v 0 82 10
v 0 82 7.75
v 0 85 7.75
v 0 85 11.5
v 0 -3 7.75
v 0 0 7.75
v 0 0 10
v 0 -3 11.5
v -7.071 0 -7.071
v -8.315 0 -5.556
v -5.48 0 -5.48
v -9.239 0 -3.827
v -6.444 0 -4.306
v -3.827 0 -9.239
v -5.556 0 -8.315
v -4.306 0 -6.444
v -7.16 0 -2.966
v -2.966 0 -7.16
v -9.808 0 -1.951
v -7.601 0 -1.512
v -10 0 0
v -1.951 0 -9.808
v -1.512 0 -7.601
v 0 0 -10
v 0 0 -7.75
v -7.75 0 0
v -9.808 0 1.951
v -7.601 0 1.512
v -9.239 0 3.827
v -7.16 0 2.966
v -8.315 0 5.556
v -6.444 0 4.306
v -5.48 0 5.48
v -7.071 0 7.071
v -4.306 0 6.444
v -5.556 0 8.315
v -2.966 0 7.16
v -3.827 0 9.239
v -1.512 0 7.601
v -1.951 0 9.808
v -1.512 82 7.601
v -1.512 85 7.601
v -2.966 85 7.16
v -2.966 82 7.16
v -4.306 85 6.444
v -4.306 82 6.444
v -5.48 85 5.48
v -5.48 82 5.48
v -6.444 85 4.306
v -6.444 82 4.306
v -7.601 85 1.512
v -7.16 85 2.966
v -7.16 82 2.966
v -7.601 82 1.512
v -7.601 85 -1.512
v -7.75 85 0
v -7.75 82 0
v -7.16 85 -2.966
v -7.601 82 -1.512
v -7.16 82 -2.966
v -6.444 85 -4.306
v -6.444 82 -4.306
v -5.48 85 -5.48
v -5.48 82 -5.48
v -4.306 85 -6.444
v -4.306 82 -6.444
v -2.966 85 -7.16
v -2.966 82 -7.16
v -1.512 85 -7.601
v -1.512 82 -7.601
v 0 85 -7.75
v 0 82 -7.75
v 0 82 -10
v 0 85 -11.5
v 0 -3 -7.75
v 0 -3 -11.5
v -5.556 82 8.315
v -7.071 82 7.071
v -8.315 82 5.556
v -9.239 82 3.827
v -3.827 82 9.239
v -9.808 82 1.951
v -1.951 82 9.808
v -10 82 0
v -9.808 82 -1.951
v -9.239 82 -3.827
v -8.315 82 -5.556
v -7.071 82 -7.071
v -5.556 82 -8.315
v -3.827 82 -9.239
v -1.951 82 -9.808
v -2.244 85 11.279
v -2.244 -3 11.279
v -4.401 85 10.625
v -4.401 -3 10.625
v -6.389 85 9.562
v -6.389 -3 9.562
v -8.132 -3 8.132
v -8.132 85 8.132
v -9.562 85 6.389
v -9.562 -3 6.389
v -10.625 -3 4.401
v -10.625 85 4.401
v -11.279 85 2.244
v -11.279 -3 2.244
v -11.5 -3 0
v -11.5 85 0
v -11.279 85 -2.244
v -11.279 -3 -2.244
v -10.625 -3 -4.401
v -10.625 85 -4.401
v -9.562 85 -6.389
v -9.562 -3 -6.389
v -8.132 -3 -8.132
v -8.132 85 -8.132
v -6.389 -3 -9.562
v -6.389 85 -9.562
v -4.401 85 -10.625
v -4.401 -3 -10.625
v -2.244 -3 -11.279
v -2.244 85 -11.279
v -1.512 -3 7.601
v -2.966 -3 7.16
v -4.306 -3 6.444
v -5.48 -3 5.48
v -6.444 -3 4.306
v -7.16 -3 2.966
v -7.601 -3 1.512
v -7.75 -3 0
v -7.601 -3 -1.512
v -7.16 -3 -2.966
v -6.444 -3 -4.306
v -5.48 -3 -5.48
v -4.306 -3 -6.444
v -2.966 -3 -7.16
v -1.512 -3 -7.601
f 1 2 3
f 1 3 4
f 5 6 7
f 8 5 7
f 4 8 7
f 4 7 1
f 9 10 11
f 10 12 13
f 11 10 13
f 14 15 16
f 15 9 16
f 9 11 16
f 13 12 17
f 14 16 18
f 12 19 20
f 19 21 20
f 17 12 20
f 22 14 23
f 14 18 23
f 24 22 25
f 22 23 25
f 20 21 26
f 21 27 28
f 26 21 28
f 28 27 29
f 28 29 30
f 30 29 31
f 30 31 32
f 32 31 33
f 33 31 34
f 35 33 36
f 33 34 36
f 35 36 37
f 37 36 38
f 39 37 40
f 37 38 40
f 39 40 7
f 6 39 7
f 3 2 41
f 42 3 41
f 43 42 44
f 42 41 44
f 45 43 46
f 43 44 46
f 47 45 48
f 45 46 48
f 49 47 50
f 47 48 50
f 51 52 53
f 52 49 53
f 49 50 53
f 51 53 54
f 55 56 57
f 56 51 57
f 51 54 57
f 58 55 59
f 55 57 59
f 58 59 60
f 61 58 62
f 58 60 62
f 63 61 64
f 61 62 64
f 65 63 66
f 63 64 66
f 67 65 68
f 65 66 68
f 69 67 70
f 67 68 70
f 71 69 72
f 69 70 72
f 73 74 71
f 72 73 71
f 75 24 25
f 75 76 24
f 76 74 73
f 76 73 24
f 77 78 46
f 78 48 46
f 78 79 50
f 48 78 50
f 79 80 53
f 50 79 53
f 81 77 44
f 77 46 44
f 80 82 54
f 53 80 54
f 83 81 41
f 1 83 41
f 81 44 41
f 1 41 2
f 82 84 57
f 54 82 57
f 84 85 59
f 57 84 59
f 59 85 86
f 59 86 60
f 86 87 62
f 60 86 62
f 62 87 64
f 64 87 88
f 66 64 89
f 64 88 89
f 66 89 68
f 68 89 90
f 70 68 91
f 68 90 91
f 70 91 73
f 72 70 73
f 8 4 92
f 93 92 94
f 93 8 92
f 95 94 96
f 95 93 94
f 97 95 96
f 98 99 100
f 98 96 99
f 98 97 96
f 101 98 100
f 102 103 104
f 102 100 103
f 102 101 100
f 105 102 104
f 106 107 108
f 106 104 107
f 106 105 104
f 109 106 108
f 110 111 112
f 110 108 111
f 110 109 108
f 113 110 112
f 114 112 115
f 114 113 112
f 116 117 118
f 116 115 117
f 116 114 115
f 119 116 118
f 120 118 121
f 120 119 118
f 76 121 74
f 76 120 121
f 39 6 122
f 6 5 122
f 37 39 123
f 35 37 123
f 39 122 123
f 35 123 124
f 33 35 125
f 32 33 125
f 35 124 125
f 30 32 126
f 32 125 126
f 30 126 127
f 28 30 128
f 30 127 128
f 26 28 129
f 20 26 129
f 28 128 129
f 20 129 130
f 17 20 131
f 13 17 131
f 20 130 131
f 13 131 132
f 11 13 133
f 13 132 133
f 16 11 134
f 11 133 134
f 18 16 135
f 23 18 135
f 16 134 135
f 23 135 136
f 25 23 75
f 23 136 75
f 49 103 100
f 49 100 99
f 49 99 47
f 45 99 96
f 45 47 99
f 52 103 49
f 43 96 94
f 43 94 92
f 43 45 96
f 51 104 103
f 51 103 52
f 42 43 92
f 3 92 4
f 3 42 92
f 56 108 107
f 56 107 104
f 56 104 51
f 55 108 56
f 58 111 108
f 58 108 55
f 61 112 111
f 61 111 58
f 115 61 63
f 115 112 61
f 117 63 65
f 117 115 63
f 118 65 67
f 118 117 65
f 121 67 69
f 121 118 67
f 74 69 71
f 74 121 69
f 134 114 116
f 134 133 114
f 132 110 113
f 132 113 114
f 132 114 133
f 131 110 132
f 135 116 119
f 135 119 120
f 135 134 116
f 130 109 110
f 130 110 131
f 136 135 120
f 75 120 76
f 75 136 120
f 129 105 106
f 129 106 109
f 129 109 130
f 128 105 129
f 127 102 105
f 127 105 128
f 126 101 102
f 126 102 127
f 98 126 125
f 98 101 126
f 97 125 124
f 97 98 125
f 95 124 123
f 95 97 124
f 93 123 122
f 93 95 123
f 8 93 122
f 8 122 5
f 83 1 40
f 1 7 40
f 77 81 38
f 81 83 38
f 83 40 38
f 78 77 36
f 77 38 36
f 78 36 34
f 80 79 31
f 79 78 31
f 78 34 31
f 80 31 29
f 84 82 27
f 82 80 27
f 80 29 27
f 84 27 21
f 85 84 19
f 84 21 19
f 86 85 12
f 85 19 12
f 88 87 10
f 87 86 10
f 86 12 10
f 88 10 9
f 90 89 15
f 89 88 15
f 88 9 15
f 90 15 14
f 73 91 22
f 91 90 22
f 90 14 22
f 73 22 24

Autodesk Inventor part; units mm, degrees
ref_plane "YZ Plane" through (0, 0, 0) normal (1, 0, 0) x (0, 1, 0)
ref_plane "XZ Plane" through (0, 0, 0) normal (0, 1, 0) x (-1, 0, 0)
ref_plane "XY Plane" through (0, 0, 0) normal (0, 0, 1) x (1, 0, 0)
sketch "草圖1" plane through (0, 0, 0) normal (0, 1, 0) x (-1, 0, 0)
  arc A0 (0, -10) -> (0, 10) centre (0, 0) ccw
  arc A1 (0, -11.5) -> (0, 11.5) centre (0, 0) ccw
  line L0 (0, 11.5) -> (0, 10)
  line L1 (0, -10) -> (0, -11.5)
  dimension "d0" = 20
  dimension "d1" = 23
extrude "擠出1" add sketch "草圖1" along normal blind 41
sketch "草圖2" plane through (0, 41, 0) normal (0, 1, 0) x (1, 0, 0)
  line L0 (0, -11.5) -> (0, -10) projected
  arc A0 (0, 11.5) -> (0, -11.5) centre (0, 0) ccw projected
  line L1 (0, 10) -> (0, 11.5) projected
  line L2 (0, -10) -> (0, 10)
extrude "擠出2" add sketch "草圖2" along normal blind 3
sketch "草圖3" plane through (0, 44, 0) normal (0, 1, 0) x (1, 0, 0)
  arc A0 (0, 7.75) -> (0, -7.75) centre (0, 0) ccw
  line L0 (0, -10) -> (0, 10) projected
  line L1 (0, -7.75) -> (0, 7.75)
  dimension "d7" = 15.5
extrude "擠出3" cut sketch "草圖3" against normal up to next
sketch "草圖5" plane through (0, 0, 0) normal (0, -1, 0) x (1, 0, 0)
  arc A0 (0, 10) -> (0, -10) centre (0, 0) ccw projected
  line L0 (0, 10) -> (0, 11.5) projected
  arc A1 (0, 11.5) -> (0, -11.5) centre (0, 0) ccw projected
  line L1 (0, -11.5) -> (0, -10) projected
  line L2 (0, 11.5) -> (0, -11.5)
extrude "擠出4" add sketch "草圖5" along normal blind 3
sketch "草圖7" plane through (0, -3, 0) normal (0, -1, 0) x (1, 0, 0)
  arc A0 (0, 7.75) -> (0, -7.75) centre (0, 0) ccw
  line L0 (0, -11.5) -> (0, 11.5) projected
  line L1 (0, -7.75) -> (0, 7.75)
  dimension "d13" = 15.5
extrude "擠出5" cut sketch "草圖7" against normal up to next
sketch "草圖8" plane through (0, 44, 0) normal (0, 1, 0) x (1, 0, 0)
  arc A0 (0, 11.5) -> (0, -11.5) centre (0, 0) ccw projected
  arc A1 (0, 10) -> (0, -10) centre (0, 0) ccw projected
  line L0 (0, 7.75) -> (0, 11.5) projected
  line L1 (0, 11.5) -> (0, 10)
  line L2 (0, -10) -> (0, -11.5)
extrude "擠出6" add sketch "草圖8" along normal blind 38
sketch "草圖9" plane through (0, 82, 0) normal (0, 1, 0) x (1, 0, 0)
  arc A0 (0, 11.5) -> (0, -11.5) centre (0, 0) ccw projected
  arc A1 (0, 7.75) -> (0, -7.75) centre (0, 0) ccw projected
  line L0 (0, 11.5) -> (0, 7.75) projected
  line L1 (0, -7.75) -> (0, -11.5) projected
extrude "擠出7" add sketch "草圖9" along normal blind 3
sketch "草圖10" plane through (0, 44, 0) normal (0, 1, 0) x (1, 0, 0)
  arc A0 (0, 10) -> (0, -10) centre (0, 0) ccw projected
  line L0 (0, -10) -> (0, -7.75) projected
  arc A1 (0, 7.75) -> (0, -7.75) centre (0, 0) ccw projected
  line L1 (0, 7.75) -> (0, 10) projected
extrude "擠出8" cut sketch "草圖10" against normal blind 3
sketch "Sketch11" plane through (0, 0, 0) normal (0, 0, 1) x (1, 0, 0)
  line L0 (0, 85) -> (-11.5, 85) projected
  line L1 (-11.5, -3) -> (0, -3) projected
  point P0 (0, 0)
  dimension "d22" = 88
properties part number "蓋子"
